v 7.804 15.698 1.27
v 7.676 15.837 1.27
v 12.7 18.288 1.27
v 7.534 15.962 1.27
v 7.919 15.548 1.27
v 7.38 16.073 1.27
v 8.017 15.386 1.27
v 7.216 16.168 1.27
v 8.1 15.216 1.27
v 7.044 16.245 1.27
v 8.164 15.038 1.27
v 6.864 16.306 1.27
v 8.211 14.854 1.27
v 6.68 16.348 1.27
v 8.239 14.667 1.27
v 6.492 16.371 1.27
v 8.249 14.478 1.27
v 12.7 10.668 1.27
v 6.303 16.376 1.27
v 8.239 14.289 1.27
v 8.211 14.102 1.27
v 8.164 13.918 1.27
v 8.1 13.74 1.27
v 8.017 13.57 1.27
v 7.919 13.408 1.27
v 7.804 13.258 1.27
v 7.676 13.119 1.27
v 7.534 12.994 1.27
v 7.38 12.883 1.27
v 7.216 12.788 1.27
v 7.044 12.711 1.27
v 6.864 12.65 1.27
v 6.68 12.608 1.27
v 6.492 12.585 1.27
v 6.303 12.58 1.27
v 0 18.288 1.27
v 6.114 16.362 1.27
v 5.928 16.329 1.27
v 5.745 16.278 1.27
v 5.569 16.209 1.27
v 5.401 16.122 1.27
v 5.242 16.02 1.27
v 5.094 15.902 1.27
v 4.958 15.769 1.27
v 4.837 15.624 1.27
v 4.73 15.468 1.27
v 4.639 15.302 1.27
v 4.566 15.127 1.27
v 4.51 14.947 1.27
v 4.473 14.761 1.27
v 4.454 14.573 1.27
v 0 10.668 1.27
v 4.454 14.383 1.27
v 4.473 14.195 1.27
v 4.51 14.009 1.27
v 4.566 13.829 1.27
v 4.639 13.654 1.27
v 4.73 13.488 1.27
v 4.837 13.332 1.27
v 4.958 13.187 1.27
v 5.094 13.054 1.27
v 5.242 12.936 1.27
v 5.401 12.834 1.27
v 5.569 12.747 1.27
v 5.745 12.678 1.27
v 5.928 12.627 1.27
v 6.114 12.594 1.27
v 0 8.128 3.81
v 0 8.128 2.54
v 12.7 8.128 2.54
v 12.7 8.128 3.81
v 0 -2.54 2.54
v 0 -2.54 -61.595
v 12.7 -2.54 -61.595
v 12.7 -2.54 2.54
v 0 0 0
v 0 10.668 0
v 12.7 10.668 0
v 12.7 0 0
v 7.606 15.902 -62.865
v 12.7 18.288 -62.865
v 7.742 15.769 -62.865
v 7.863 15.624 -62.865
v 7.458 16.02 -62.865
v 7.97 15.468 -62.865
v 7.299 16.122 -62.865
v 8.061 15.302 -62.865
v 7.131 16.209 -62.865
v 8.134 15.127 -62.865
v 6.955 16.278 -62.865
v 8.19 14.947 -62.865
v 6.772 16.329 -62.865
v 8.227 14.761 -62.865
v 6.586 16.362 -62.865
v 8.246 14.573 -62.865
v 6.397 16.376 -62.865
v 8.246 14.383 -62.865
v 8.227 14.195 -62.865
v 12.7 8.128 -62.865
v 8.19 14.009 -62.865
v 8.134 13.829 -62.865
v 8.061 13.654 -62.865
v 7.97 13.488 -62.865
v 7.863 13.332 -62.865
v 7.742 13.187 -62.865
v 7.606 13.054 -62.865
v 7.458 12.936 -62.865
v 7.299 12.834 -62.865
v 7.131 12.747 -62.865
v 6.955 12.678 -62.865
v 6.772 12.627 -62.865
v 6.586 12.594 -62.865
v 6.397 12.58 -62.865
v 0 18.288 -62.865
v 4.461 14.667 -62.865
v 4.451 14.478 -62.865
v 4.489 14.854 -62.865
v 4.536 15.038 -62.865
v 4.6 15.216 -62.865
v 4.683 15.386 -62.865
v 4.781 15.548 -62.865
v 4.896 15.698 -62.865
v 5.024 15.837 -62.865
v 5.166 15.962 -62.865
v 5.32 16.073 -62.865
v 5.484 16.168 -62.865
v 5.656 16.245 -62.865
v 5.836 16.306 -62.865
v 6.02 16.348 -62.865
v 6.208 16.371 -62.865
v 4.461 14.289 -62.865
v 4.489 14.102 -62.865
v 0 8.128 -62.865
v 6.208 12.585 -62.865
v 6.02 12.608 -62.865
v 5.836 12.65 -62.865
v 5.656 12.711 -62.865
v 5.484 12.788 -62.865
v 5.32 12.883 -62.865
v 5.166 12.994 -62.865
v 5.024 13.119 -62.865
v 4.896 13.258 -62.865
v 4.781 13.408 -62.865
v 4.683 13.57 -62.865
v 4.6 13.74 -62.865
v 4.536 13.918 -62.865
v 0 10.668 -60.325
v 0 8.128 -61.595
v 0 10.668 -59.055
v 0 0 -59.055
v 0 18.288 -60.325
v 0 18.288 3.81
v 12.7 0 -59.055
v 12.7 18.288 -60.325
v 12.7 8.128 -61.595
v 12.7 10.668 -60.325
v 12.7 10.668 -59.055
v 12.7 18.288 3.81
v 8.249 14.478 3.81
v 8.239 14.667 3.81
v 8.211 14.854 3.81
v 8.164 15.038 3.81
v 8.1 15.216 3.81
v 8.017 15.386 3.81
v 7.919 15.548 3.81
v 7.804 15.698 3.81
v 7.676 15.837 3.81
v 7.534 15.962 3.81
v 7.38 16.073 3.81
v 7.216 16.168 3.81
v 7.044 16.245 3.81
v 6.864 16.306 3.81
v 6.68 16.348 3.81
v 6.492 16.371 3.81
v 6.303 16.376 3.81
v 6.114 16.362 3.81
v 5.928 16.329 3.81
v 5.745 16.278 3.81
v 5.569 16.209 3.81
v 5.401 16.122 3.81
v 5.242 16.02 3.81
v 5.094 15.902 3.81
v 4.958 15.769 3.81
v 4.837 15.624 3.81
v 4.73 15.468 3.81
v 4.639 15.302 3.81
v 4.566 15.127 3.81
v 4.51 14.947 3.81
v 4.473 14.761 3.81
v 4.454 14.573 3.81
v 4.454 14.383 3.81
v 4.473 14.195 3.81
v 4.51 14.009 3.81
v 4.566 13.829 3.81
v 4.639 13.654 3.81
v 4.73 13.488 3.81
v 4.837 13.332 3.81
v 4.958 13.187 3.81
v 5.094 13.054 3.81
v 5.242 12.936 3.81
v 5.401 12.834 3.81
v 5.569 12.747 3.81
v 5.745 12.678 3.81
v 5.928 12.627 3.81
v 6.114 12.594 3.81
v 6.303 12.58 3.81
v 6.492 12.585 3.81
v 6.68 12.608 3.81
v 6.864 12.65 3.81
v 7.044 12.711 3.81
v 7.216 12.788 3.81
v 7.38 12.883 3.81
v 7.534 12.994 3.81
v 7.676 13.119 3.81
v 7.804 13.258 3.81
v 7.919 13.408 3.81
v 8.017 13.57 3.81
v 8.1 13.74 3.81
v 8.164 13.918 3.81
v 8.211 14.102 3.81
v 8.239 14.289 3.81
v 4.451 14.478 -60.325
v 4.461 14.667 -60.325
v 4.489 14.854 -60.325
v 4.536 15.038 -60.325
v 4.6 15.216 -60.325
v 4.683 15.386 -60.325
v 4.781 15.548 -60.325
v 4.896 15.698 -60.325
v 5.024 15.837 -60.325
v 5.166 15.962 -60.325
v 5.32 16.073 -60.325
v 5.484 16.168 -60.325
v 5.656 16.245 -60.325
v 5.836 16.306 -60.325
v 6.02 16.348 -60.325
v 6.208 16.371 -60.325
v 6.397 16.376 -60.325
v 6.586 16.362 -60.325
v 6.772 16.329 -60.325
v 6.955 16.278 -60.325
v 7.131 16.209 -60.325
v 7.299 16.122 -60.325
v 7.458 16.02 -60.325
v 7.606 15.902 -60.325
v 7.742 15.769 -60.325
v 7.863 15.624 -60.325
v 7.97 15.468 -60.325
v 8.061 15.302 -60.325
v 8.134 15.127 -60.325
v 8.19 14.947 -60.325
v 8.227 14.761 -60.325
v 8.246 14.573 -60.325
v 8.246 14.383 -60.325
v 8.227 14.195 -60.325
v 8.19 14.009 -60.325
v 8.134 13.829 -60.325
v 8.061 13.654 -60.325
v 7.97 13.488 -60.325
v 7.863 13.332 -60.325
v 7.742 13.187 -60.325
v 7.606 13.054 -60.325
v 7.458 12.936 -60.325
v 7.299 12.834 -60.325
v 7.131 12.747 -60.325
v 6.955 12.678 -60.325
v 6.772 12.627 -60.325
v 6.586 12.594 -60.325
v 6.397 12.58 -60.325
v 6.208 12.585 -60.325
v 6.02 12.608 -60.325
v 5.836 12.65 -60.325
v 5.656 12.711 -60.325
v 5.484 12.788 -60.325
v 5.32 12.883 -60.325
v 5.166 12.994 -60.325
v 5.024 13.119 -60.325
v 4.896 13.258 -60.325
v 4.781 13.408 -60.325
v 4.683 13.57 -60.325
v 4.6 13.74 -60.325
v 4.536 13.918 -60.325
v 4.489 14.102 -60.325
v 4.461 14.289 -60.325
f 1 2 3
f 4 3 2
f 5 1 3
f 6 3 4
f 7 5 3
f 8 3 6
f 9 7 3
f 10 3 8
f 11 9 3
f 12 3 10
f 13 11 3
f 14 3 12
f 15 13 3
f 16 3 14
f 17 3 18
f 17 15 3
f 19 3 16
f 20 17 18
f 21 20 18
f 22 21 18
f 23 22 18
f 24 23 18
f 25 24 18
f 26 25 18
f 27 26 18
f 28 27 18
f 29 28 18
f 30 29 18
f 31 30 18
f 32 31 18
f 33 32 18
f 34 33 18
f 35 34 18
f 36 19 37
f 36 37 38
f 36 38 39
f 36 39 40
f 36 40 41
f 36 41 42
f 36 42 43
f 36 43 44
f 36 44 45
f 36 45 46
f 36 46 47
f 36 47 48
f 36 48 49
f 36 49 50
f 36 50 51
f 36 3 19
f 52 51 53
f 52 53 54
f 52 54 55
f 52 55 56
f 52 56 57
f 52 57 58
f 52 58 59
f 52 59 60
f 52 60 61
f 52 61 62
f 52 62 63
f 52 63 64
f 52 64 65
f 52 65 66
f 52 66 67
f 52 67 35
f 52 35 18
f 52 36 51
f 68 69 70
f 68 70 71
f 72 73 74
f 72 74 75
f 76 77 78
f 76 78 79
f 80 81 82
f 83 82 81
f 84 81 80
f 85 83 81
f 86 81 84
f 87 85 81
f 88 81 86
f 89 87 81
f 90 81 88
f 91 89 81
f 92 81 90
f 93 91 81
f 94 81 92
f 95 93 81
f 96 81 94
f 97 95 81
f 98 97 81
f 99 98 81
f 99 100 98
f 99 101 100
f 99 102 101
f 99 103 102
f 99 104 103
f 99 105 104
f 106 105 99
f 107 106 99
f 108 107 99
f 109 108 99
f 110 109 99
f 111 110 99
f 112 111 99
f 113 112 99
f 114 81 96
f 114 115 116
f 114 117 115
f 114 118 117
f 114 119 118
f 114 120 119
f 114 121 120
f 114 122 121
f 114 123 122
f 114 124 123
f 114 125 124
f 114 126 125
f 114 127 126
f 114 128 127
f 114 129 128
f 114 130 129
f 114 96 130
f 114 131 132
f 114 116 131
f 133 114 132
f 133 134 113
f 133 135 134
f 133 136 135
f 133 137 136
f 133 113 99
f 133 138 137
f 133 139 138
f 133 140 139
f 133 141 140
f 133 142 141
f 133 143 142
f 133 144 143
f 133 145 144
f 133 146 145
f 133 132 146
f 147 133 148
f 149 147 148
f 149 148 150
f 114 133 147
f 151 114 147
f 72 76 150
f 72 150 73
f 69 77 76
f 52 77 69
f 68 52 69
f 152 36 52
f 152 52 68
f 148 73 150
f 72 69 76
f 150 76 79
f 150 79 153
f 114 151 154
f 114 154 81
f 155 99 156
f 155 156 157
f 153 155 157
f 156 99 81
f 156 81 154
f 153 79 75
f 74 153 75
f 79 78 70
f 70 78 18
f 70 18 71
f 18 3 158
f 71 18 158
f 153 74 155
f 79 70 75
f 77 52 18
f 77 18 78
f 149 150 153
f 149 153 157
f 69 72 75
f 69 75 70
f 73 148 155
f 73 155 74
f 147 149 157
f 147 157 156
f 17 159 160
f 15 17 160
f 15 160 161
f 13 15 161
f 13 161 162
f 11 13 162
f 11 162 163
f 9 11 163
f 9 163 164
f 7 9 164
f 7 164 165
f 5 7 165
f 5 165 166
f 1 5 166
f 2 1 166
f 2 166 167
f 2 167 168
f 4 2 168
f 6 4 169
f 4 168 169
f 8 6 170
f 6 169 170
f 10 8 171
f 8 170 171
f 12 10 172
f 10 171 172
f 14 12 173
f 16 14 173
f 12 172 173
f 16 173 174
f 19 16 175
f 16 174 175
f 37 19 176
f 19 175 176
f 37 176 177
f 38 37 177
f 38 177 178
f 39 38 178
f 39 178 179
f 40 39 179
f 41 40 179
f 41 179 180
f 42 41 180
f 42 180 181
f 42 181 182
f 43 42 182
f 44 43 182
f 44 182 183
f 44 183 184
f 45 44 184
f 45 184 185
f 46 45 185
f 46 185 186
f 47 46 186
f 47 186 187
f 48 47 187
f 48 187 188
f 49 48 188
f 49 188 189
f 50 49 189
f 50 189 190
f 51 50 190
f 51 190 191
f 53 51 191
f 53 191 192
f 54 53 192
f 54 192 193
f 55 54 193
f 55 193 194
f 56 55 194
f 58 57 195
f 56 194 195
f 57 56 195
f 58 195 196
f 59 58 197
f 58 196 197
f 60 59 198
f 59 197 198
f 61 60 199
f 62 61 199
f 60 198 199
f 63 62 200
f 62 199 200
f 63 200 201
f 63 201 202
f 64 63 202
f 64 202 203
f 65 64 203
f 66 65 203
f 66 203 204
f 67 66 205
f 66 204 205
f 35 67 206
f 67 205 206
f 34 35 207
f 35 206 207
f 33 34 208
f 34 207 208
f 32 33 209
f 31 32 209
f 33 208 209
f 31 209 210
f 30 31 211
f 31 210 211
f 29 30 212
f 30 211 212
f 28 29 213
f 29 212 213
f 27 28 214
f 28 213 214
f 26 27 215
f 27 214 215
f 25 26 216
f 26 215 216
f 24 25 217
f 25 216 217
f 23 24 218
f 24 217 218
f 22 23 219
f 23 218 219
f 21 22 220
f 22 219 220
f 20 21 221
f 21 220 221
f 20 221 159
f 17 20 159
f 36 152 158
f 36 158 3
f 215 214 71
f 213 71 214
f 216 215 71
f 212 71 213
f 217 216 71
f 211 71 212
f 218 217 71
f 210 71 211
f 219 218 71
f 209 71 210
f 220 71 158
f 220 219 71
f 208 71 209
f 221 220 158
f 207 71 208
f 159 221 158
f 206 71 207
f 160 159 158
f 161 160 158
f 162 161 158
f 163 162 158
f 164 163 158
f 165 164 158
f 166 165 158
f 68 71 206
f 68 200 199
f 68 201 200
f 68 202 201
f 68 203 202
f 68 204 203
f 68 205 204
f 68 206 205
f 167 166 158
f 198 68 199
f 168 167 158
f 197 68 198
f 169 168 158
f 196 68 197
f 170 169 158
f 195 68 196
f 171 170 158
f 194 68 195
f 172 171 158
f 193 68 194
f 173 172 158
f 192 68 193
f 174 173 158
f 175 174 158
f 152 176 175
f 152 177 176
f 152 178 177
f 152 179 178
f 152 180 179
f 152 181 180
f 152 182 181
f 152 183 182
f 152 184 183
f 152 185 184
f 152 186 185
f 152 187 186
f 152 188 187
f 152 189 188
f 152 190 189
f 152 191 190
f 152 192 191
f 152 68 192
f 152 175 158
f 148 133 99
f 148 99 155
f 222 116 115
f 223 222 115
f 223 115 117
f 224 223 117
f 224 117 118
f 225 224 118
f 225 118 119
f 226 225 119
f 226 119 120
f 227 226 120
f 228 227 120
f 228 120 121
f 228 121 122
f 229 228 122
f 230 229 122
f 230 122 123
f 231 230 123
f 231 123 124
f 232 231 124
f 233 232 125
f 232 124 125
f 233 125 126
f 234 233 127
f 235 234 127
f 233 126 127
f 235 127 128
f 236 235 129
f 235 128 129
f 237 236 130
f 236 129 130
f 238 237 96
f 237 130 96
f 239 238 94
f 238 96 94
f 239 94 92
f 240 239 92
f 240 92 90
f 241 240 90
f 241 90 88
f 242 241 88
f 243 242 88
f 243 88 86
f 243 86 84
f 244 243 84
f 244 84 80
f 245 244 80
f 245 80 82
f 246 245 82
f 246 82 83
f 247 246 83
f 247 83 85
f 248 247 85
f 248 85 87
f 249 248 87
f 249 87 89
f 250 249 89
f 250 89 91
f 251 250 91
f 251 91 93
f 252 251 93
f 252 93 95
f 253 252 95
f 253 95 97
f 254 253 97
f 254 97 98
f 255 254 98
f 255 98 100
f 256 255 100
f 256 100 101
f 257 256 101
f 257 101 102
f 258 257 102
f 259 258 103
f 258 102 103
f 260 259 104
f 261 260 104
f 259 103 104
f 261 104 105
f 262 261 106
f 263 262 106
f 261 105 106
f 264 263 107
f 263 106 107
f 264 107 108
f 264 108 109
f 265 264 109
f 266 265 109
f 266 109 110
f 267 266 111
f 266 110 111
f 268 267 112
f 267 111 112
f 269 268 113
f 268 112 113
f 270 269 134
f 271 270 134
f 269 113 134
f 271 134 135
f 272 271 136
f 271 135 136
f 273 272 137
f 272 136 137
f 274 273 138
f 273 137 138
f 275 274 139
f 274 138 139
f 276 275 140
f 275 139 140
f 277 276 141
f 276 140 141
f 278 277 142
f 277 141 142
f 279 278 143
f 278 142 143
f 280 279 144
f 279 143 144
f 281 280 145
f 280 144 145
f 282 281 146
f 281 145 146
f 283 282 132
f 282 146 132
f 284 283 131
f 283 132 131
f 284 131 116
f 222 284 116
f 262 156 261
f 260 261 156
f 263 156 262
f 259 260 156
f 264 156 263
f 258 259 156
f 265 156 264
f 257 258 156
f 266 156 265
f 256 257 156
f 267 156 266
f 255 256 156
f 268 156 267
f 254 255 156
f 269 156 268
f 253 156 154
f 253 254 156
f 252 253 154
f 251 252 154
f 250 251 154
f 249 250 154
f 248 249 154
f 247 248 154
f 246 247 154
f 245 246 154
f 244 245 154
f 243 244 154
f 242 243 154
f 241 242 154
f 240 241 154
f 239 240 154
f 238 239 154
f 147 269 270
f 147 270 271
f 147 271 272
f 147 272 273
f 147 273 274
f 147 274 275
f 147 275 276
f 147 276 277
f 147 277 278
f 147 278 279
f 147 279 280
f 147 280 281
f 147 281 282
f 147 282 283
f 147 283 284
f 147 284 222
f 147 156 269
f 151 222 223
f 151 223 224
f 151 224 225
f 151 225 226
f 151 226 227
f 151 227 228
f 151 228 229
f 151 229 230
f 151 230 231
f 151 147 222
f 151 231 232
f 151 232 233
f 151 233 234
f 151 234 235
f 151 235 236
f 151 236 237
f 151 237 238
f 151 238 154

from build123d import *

# Parameters (mm, degrees)
EXTRUDE_THIN1_DEPTH       = 12.7
F_6_CLEARANCE_HOLE1_D     = 3.7973
F_6_CLEARANCE_HOLE1_DEPTH = 7.62
F_6_CLEARANCE_HOLE1_TIP   = 1.140824014
F_6_CLEARANCE_HOLE2_D     = 3.7973
F_6_CLEARANCE_HOLE2_DEPTH = 7.62
F_6_CLEARANCE_HOLE2_TIP   = 1.140824014


with BuildPart() as part:
    # Sketch1 → Extrude-Thin1 (new body)
    with BuildSketch(Plane(origin=(0, 0, 0), x_dir=(0, 0, -1), z_dir=(1, 0, 0))):
        Polygon((-1.27, 18.288), (-1.27, 10.668), (0, 10.668), (0, 0), (59.055, 0), (59.055, 10.668), (60.325, 10.668), (60.325, 18.288), (62.865, 18.288), (62.865, 8.128), (61.595, 8.128), (61.595, -2.54), (-2.54, -2.54), (-2.54, 8.128), (-3.81, 8.128), (-3.81, 18.288), align=None)
    extrude(amount=EXTRUDE_THIN1_DEPTH)

    # #6 Clearance Hole1
    with Locations(Plane(origin=(0, 0, 1.27), x_dir=(-1, 0, 0), z_dir=(0, 0, -1))):
        with Locations((-6.35, 14.478)):
            Hole(F_6_CLEARANCE_HOLE1_D / 2, depth=F_6_CLEARANCE_HOLE1_DEPTH)
            with Locations((0, 0, -(F_6_CLEARANCE_HOLE1_DEPTH + F_6_CLEARANCE_HOLE1_TIP / 2))):  # 118° drill point
                Cone(0, F_6_CLEARANCE_HOLE1_D / 2, F_6_CLEARANCE_HOLE1_TIP, mode=Mode.SUBTRACT)

    # #6 Clearance Hole2
    with Locations(Plane.XY.offset(-60.325)):
        with Locations((6.35, 14.478)):
            Hole(F_6_CLEARANCE_HOLE2_D / 2, depth=F_6_CLEARANCE_HOLE2_DEPTH)
            with Locations((0, 0, -(F_6_CLEARANCE_HOLE2_DEPTH + F_6_CLEARANCE_HOLE2_TIP / 2))):  # 118° drill point
                Cone(0, F_6_CLEARANCE_HOLE2_D / 2, F_6_CLEARANCE_HOLE2_TIP, mode=Mode.SUBTRACT)


solid = part.part
